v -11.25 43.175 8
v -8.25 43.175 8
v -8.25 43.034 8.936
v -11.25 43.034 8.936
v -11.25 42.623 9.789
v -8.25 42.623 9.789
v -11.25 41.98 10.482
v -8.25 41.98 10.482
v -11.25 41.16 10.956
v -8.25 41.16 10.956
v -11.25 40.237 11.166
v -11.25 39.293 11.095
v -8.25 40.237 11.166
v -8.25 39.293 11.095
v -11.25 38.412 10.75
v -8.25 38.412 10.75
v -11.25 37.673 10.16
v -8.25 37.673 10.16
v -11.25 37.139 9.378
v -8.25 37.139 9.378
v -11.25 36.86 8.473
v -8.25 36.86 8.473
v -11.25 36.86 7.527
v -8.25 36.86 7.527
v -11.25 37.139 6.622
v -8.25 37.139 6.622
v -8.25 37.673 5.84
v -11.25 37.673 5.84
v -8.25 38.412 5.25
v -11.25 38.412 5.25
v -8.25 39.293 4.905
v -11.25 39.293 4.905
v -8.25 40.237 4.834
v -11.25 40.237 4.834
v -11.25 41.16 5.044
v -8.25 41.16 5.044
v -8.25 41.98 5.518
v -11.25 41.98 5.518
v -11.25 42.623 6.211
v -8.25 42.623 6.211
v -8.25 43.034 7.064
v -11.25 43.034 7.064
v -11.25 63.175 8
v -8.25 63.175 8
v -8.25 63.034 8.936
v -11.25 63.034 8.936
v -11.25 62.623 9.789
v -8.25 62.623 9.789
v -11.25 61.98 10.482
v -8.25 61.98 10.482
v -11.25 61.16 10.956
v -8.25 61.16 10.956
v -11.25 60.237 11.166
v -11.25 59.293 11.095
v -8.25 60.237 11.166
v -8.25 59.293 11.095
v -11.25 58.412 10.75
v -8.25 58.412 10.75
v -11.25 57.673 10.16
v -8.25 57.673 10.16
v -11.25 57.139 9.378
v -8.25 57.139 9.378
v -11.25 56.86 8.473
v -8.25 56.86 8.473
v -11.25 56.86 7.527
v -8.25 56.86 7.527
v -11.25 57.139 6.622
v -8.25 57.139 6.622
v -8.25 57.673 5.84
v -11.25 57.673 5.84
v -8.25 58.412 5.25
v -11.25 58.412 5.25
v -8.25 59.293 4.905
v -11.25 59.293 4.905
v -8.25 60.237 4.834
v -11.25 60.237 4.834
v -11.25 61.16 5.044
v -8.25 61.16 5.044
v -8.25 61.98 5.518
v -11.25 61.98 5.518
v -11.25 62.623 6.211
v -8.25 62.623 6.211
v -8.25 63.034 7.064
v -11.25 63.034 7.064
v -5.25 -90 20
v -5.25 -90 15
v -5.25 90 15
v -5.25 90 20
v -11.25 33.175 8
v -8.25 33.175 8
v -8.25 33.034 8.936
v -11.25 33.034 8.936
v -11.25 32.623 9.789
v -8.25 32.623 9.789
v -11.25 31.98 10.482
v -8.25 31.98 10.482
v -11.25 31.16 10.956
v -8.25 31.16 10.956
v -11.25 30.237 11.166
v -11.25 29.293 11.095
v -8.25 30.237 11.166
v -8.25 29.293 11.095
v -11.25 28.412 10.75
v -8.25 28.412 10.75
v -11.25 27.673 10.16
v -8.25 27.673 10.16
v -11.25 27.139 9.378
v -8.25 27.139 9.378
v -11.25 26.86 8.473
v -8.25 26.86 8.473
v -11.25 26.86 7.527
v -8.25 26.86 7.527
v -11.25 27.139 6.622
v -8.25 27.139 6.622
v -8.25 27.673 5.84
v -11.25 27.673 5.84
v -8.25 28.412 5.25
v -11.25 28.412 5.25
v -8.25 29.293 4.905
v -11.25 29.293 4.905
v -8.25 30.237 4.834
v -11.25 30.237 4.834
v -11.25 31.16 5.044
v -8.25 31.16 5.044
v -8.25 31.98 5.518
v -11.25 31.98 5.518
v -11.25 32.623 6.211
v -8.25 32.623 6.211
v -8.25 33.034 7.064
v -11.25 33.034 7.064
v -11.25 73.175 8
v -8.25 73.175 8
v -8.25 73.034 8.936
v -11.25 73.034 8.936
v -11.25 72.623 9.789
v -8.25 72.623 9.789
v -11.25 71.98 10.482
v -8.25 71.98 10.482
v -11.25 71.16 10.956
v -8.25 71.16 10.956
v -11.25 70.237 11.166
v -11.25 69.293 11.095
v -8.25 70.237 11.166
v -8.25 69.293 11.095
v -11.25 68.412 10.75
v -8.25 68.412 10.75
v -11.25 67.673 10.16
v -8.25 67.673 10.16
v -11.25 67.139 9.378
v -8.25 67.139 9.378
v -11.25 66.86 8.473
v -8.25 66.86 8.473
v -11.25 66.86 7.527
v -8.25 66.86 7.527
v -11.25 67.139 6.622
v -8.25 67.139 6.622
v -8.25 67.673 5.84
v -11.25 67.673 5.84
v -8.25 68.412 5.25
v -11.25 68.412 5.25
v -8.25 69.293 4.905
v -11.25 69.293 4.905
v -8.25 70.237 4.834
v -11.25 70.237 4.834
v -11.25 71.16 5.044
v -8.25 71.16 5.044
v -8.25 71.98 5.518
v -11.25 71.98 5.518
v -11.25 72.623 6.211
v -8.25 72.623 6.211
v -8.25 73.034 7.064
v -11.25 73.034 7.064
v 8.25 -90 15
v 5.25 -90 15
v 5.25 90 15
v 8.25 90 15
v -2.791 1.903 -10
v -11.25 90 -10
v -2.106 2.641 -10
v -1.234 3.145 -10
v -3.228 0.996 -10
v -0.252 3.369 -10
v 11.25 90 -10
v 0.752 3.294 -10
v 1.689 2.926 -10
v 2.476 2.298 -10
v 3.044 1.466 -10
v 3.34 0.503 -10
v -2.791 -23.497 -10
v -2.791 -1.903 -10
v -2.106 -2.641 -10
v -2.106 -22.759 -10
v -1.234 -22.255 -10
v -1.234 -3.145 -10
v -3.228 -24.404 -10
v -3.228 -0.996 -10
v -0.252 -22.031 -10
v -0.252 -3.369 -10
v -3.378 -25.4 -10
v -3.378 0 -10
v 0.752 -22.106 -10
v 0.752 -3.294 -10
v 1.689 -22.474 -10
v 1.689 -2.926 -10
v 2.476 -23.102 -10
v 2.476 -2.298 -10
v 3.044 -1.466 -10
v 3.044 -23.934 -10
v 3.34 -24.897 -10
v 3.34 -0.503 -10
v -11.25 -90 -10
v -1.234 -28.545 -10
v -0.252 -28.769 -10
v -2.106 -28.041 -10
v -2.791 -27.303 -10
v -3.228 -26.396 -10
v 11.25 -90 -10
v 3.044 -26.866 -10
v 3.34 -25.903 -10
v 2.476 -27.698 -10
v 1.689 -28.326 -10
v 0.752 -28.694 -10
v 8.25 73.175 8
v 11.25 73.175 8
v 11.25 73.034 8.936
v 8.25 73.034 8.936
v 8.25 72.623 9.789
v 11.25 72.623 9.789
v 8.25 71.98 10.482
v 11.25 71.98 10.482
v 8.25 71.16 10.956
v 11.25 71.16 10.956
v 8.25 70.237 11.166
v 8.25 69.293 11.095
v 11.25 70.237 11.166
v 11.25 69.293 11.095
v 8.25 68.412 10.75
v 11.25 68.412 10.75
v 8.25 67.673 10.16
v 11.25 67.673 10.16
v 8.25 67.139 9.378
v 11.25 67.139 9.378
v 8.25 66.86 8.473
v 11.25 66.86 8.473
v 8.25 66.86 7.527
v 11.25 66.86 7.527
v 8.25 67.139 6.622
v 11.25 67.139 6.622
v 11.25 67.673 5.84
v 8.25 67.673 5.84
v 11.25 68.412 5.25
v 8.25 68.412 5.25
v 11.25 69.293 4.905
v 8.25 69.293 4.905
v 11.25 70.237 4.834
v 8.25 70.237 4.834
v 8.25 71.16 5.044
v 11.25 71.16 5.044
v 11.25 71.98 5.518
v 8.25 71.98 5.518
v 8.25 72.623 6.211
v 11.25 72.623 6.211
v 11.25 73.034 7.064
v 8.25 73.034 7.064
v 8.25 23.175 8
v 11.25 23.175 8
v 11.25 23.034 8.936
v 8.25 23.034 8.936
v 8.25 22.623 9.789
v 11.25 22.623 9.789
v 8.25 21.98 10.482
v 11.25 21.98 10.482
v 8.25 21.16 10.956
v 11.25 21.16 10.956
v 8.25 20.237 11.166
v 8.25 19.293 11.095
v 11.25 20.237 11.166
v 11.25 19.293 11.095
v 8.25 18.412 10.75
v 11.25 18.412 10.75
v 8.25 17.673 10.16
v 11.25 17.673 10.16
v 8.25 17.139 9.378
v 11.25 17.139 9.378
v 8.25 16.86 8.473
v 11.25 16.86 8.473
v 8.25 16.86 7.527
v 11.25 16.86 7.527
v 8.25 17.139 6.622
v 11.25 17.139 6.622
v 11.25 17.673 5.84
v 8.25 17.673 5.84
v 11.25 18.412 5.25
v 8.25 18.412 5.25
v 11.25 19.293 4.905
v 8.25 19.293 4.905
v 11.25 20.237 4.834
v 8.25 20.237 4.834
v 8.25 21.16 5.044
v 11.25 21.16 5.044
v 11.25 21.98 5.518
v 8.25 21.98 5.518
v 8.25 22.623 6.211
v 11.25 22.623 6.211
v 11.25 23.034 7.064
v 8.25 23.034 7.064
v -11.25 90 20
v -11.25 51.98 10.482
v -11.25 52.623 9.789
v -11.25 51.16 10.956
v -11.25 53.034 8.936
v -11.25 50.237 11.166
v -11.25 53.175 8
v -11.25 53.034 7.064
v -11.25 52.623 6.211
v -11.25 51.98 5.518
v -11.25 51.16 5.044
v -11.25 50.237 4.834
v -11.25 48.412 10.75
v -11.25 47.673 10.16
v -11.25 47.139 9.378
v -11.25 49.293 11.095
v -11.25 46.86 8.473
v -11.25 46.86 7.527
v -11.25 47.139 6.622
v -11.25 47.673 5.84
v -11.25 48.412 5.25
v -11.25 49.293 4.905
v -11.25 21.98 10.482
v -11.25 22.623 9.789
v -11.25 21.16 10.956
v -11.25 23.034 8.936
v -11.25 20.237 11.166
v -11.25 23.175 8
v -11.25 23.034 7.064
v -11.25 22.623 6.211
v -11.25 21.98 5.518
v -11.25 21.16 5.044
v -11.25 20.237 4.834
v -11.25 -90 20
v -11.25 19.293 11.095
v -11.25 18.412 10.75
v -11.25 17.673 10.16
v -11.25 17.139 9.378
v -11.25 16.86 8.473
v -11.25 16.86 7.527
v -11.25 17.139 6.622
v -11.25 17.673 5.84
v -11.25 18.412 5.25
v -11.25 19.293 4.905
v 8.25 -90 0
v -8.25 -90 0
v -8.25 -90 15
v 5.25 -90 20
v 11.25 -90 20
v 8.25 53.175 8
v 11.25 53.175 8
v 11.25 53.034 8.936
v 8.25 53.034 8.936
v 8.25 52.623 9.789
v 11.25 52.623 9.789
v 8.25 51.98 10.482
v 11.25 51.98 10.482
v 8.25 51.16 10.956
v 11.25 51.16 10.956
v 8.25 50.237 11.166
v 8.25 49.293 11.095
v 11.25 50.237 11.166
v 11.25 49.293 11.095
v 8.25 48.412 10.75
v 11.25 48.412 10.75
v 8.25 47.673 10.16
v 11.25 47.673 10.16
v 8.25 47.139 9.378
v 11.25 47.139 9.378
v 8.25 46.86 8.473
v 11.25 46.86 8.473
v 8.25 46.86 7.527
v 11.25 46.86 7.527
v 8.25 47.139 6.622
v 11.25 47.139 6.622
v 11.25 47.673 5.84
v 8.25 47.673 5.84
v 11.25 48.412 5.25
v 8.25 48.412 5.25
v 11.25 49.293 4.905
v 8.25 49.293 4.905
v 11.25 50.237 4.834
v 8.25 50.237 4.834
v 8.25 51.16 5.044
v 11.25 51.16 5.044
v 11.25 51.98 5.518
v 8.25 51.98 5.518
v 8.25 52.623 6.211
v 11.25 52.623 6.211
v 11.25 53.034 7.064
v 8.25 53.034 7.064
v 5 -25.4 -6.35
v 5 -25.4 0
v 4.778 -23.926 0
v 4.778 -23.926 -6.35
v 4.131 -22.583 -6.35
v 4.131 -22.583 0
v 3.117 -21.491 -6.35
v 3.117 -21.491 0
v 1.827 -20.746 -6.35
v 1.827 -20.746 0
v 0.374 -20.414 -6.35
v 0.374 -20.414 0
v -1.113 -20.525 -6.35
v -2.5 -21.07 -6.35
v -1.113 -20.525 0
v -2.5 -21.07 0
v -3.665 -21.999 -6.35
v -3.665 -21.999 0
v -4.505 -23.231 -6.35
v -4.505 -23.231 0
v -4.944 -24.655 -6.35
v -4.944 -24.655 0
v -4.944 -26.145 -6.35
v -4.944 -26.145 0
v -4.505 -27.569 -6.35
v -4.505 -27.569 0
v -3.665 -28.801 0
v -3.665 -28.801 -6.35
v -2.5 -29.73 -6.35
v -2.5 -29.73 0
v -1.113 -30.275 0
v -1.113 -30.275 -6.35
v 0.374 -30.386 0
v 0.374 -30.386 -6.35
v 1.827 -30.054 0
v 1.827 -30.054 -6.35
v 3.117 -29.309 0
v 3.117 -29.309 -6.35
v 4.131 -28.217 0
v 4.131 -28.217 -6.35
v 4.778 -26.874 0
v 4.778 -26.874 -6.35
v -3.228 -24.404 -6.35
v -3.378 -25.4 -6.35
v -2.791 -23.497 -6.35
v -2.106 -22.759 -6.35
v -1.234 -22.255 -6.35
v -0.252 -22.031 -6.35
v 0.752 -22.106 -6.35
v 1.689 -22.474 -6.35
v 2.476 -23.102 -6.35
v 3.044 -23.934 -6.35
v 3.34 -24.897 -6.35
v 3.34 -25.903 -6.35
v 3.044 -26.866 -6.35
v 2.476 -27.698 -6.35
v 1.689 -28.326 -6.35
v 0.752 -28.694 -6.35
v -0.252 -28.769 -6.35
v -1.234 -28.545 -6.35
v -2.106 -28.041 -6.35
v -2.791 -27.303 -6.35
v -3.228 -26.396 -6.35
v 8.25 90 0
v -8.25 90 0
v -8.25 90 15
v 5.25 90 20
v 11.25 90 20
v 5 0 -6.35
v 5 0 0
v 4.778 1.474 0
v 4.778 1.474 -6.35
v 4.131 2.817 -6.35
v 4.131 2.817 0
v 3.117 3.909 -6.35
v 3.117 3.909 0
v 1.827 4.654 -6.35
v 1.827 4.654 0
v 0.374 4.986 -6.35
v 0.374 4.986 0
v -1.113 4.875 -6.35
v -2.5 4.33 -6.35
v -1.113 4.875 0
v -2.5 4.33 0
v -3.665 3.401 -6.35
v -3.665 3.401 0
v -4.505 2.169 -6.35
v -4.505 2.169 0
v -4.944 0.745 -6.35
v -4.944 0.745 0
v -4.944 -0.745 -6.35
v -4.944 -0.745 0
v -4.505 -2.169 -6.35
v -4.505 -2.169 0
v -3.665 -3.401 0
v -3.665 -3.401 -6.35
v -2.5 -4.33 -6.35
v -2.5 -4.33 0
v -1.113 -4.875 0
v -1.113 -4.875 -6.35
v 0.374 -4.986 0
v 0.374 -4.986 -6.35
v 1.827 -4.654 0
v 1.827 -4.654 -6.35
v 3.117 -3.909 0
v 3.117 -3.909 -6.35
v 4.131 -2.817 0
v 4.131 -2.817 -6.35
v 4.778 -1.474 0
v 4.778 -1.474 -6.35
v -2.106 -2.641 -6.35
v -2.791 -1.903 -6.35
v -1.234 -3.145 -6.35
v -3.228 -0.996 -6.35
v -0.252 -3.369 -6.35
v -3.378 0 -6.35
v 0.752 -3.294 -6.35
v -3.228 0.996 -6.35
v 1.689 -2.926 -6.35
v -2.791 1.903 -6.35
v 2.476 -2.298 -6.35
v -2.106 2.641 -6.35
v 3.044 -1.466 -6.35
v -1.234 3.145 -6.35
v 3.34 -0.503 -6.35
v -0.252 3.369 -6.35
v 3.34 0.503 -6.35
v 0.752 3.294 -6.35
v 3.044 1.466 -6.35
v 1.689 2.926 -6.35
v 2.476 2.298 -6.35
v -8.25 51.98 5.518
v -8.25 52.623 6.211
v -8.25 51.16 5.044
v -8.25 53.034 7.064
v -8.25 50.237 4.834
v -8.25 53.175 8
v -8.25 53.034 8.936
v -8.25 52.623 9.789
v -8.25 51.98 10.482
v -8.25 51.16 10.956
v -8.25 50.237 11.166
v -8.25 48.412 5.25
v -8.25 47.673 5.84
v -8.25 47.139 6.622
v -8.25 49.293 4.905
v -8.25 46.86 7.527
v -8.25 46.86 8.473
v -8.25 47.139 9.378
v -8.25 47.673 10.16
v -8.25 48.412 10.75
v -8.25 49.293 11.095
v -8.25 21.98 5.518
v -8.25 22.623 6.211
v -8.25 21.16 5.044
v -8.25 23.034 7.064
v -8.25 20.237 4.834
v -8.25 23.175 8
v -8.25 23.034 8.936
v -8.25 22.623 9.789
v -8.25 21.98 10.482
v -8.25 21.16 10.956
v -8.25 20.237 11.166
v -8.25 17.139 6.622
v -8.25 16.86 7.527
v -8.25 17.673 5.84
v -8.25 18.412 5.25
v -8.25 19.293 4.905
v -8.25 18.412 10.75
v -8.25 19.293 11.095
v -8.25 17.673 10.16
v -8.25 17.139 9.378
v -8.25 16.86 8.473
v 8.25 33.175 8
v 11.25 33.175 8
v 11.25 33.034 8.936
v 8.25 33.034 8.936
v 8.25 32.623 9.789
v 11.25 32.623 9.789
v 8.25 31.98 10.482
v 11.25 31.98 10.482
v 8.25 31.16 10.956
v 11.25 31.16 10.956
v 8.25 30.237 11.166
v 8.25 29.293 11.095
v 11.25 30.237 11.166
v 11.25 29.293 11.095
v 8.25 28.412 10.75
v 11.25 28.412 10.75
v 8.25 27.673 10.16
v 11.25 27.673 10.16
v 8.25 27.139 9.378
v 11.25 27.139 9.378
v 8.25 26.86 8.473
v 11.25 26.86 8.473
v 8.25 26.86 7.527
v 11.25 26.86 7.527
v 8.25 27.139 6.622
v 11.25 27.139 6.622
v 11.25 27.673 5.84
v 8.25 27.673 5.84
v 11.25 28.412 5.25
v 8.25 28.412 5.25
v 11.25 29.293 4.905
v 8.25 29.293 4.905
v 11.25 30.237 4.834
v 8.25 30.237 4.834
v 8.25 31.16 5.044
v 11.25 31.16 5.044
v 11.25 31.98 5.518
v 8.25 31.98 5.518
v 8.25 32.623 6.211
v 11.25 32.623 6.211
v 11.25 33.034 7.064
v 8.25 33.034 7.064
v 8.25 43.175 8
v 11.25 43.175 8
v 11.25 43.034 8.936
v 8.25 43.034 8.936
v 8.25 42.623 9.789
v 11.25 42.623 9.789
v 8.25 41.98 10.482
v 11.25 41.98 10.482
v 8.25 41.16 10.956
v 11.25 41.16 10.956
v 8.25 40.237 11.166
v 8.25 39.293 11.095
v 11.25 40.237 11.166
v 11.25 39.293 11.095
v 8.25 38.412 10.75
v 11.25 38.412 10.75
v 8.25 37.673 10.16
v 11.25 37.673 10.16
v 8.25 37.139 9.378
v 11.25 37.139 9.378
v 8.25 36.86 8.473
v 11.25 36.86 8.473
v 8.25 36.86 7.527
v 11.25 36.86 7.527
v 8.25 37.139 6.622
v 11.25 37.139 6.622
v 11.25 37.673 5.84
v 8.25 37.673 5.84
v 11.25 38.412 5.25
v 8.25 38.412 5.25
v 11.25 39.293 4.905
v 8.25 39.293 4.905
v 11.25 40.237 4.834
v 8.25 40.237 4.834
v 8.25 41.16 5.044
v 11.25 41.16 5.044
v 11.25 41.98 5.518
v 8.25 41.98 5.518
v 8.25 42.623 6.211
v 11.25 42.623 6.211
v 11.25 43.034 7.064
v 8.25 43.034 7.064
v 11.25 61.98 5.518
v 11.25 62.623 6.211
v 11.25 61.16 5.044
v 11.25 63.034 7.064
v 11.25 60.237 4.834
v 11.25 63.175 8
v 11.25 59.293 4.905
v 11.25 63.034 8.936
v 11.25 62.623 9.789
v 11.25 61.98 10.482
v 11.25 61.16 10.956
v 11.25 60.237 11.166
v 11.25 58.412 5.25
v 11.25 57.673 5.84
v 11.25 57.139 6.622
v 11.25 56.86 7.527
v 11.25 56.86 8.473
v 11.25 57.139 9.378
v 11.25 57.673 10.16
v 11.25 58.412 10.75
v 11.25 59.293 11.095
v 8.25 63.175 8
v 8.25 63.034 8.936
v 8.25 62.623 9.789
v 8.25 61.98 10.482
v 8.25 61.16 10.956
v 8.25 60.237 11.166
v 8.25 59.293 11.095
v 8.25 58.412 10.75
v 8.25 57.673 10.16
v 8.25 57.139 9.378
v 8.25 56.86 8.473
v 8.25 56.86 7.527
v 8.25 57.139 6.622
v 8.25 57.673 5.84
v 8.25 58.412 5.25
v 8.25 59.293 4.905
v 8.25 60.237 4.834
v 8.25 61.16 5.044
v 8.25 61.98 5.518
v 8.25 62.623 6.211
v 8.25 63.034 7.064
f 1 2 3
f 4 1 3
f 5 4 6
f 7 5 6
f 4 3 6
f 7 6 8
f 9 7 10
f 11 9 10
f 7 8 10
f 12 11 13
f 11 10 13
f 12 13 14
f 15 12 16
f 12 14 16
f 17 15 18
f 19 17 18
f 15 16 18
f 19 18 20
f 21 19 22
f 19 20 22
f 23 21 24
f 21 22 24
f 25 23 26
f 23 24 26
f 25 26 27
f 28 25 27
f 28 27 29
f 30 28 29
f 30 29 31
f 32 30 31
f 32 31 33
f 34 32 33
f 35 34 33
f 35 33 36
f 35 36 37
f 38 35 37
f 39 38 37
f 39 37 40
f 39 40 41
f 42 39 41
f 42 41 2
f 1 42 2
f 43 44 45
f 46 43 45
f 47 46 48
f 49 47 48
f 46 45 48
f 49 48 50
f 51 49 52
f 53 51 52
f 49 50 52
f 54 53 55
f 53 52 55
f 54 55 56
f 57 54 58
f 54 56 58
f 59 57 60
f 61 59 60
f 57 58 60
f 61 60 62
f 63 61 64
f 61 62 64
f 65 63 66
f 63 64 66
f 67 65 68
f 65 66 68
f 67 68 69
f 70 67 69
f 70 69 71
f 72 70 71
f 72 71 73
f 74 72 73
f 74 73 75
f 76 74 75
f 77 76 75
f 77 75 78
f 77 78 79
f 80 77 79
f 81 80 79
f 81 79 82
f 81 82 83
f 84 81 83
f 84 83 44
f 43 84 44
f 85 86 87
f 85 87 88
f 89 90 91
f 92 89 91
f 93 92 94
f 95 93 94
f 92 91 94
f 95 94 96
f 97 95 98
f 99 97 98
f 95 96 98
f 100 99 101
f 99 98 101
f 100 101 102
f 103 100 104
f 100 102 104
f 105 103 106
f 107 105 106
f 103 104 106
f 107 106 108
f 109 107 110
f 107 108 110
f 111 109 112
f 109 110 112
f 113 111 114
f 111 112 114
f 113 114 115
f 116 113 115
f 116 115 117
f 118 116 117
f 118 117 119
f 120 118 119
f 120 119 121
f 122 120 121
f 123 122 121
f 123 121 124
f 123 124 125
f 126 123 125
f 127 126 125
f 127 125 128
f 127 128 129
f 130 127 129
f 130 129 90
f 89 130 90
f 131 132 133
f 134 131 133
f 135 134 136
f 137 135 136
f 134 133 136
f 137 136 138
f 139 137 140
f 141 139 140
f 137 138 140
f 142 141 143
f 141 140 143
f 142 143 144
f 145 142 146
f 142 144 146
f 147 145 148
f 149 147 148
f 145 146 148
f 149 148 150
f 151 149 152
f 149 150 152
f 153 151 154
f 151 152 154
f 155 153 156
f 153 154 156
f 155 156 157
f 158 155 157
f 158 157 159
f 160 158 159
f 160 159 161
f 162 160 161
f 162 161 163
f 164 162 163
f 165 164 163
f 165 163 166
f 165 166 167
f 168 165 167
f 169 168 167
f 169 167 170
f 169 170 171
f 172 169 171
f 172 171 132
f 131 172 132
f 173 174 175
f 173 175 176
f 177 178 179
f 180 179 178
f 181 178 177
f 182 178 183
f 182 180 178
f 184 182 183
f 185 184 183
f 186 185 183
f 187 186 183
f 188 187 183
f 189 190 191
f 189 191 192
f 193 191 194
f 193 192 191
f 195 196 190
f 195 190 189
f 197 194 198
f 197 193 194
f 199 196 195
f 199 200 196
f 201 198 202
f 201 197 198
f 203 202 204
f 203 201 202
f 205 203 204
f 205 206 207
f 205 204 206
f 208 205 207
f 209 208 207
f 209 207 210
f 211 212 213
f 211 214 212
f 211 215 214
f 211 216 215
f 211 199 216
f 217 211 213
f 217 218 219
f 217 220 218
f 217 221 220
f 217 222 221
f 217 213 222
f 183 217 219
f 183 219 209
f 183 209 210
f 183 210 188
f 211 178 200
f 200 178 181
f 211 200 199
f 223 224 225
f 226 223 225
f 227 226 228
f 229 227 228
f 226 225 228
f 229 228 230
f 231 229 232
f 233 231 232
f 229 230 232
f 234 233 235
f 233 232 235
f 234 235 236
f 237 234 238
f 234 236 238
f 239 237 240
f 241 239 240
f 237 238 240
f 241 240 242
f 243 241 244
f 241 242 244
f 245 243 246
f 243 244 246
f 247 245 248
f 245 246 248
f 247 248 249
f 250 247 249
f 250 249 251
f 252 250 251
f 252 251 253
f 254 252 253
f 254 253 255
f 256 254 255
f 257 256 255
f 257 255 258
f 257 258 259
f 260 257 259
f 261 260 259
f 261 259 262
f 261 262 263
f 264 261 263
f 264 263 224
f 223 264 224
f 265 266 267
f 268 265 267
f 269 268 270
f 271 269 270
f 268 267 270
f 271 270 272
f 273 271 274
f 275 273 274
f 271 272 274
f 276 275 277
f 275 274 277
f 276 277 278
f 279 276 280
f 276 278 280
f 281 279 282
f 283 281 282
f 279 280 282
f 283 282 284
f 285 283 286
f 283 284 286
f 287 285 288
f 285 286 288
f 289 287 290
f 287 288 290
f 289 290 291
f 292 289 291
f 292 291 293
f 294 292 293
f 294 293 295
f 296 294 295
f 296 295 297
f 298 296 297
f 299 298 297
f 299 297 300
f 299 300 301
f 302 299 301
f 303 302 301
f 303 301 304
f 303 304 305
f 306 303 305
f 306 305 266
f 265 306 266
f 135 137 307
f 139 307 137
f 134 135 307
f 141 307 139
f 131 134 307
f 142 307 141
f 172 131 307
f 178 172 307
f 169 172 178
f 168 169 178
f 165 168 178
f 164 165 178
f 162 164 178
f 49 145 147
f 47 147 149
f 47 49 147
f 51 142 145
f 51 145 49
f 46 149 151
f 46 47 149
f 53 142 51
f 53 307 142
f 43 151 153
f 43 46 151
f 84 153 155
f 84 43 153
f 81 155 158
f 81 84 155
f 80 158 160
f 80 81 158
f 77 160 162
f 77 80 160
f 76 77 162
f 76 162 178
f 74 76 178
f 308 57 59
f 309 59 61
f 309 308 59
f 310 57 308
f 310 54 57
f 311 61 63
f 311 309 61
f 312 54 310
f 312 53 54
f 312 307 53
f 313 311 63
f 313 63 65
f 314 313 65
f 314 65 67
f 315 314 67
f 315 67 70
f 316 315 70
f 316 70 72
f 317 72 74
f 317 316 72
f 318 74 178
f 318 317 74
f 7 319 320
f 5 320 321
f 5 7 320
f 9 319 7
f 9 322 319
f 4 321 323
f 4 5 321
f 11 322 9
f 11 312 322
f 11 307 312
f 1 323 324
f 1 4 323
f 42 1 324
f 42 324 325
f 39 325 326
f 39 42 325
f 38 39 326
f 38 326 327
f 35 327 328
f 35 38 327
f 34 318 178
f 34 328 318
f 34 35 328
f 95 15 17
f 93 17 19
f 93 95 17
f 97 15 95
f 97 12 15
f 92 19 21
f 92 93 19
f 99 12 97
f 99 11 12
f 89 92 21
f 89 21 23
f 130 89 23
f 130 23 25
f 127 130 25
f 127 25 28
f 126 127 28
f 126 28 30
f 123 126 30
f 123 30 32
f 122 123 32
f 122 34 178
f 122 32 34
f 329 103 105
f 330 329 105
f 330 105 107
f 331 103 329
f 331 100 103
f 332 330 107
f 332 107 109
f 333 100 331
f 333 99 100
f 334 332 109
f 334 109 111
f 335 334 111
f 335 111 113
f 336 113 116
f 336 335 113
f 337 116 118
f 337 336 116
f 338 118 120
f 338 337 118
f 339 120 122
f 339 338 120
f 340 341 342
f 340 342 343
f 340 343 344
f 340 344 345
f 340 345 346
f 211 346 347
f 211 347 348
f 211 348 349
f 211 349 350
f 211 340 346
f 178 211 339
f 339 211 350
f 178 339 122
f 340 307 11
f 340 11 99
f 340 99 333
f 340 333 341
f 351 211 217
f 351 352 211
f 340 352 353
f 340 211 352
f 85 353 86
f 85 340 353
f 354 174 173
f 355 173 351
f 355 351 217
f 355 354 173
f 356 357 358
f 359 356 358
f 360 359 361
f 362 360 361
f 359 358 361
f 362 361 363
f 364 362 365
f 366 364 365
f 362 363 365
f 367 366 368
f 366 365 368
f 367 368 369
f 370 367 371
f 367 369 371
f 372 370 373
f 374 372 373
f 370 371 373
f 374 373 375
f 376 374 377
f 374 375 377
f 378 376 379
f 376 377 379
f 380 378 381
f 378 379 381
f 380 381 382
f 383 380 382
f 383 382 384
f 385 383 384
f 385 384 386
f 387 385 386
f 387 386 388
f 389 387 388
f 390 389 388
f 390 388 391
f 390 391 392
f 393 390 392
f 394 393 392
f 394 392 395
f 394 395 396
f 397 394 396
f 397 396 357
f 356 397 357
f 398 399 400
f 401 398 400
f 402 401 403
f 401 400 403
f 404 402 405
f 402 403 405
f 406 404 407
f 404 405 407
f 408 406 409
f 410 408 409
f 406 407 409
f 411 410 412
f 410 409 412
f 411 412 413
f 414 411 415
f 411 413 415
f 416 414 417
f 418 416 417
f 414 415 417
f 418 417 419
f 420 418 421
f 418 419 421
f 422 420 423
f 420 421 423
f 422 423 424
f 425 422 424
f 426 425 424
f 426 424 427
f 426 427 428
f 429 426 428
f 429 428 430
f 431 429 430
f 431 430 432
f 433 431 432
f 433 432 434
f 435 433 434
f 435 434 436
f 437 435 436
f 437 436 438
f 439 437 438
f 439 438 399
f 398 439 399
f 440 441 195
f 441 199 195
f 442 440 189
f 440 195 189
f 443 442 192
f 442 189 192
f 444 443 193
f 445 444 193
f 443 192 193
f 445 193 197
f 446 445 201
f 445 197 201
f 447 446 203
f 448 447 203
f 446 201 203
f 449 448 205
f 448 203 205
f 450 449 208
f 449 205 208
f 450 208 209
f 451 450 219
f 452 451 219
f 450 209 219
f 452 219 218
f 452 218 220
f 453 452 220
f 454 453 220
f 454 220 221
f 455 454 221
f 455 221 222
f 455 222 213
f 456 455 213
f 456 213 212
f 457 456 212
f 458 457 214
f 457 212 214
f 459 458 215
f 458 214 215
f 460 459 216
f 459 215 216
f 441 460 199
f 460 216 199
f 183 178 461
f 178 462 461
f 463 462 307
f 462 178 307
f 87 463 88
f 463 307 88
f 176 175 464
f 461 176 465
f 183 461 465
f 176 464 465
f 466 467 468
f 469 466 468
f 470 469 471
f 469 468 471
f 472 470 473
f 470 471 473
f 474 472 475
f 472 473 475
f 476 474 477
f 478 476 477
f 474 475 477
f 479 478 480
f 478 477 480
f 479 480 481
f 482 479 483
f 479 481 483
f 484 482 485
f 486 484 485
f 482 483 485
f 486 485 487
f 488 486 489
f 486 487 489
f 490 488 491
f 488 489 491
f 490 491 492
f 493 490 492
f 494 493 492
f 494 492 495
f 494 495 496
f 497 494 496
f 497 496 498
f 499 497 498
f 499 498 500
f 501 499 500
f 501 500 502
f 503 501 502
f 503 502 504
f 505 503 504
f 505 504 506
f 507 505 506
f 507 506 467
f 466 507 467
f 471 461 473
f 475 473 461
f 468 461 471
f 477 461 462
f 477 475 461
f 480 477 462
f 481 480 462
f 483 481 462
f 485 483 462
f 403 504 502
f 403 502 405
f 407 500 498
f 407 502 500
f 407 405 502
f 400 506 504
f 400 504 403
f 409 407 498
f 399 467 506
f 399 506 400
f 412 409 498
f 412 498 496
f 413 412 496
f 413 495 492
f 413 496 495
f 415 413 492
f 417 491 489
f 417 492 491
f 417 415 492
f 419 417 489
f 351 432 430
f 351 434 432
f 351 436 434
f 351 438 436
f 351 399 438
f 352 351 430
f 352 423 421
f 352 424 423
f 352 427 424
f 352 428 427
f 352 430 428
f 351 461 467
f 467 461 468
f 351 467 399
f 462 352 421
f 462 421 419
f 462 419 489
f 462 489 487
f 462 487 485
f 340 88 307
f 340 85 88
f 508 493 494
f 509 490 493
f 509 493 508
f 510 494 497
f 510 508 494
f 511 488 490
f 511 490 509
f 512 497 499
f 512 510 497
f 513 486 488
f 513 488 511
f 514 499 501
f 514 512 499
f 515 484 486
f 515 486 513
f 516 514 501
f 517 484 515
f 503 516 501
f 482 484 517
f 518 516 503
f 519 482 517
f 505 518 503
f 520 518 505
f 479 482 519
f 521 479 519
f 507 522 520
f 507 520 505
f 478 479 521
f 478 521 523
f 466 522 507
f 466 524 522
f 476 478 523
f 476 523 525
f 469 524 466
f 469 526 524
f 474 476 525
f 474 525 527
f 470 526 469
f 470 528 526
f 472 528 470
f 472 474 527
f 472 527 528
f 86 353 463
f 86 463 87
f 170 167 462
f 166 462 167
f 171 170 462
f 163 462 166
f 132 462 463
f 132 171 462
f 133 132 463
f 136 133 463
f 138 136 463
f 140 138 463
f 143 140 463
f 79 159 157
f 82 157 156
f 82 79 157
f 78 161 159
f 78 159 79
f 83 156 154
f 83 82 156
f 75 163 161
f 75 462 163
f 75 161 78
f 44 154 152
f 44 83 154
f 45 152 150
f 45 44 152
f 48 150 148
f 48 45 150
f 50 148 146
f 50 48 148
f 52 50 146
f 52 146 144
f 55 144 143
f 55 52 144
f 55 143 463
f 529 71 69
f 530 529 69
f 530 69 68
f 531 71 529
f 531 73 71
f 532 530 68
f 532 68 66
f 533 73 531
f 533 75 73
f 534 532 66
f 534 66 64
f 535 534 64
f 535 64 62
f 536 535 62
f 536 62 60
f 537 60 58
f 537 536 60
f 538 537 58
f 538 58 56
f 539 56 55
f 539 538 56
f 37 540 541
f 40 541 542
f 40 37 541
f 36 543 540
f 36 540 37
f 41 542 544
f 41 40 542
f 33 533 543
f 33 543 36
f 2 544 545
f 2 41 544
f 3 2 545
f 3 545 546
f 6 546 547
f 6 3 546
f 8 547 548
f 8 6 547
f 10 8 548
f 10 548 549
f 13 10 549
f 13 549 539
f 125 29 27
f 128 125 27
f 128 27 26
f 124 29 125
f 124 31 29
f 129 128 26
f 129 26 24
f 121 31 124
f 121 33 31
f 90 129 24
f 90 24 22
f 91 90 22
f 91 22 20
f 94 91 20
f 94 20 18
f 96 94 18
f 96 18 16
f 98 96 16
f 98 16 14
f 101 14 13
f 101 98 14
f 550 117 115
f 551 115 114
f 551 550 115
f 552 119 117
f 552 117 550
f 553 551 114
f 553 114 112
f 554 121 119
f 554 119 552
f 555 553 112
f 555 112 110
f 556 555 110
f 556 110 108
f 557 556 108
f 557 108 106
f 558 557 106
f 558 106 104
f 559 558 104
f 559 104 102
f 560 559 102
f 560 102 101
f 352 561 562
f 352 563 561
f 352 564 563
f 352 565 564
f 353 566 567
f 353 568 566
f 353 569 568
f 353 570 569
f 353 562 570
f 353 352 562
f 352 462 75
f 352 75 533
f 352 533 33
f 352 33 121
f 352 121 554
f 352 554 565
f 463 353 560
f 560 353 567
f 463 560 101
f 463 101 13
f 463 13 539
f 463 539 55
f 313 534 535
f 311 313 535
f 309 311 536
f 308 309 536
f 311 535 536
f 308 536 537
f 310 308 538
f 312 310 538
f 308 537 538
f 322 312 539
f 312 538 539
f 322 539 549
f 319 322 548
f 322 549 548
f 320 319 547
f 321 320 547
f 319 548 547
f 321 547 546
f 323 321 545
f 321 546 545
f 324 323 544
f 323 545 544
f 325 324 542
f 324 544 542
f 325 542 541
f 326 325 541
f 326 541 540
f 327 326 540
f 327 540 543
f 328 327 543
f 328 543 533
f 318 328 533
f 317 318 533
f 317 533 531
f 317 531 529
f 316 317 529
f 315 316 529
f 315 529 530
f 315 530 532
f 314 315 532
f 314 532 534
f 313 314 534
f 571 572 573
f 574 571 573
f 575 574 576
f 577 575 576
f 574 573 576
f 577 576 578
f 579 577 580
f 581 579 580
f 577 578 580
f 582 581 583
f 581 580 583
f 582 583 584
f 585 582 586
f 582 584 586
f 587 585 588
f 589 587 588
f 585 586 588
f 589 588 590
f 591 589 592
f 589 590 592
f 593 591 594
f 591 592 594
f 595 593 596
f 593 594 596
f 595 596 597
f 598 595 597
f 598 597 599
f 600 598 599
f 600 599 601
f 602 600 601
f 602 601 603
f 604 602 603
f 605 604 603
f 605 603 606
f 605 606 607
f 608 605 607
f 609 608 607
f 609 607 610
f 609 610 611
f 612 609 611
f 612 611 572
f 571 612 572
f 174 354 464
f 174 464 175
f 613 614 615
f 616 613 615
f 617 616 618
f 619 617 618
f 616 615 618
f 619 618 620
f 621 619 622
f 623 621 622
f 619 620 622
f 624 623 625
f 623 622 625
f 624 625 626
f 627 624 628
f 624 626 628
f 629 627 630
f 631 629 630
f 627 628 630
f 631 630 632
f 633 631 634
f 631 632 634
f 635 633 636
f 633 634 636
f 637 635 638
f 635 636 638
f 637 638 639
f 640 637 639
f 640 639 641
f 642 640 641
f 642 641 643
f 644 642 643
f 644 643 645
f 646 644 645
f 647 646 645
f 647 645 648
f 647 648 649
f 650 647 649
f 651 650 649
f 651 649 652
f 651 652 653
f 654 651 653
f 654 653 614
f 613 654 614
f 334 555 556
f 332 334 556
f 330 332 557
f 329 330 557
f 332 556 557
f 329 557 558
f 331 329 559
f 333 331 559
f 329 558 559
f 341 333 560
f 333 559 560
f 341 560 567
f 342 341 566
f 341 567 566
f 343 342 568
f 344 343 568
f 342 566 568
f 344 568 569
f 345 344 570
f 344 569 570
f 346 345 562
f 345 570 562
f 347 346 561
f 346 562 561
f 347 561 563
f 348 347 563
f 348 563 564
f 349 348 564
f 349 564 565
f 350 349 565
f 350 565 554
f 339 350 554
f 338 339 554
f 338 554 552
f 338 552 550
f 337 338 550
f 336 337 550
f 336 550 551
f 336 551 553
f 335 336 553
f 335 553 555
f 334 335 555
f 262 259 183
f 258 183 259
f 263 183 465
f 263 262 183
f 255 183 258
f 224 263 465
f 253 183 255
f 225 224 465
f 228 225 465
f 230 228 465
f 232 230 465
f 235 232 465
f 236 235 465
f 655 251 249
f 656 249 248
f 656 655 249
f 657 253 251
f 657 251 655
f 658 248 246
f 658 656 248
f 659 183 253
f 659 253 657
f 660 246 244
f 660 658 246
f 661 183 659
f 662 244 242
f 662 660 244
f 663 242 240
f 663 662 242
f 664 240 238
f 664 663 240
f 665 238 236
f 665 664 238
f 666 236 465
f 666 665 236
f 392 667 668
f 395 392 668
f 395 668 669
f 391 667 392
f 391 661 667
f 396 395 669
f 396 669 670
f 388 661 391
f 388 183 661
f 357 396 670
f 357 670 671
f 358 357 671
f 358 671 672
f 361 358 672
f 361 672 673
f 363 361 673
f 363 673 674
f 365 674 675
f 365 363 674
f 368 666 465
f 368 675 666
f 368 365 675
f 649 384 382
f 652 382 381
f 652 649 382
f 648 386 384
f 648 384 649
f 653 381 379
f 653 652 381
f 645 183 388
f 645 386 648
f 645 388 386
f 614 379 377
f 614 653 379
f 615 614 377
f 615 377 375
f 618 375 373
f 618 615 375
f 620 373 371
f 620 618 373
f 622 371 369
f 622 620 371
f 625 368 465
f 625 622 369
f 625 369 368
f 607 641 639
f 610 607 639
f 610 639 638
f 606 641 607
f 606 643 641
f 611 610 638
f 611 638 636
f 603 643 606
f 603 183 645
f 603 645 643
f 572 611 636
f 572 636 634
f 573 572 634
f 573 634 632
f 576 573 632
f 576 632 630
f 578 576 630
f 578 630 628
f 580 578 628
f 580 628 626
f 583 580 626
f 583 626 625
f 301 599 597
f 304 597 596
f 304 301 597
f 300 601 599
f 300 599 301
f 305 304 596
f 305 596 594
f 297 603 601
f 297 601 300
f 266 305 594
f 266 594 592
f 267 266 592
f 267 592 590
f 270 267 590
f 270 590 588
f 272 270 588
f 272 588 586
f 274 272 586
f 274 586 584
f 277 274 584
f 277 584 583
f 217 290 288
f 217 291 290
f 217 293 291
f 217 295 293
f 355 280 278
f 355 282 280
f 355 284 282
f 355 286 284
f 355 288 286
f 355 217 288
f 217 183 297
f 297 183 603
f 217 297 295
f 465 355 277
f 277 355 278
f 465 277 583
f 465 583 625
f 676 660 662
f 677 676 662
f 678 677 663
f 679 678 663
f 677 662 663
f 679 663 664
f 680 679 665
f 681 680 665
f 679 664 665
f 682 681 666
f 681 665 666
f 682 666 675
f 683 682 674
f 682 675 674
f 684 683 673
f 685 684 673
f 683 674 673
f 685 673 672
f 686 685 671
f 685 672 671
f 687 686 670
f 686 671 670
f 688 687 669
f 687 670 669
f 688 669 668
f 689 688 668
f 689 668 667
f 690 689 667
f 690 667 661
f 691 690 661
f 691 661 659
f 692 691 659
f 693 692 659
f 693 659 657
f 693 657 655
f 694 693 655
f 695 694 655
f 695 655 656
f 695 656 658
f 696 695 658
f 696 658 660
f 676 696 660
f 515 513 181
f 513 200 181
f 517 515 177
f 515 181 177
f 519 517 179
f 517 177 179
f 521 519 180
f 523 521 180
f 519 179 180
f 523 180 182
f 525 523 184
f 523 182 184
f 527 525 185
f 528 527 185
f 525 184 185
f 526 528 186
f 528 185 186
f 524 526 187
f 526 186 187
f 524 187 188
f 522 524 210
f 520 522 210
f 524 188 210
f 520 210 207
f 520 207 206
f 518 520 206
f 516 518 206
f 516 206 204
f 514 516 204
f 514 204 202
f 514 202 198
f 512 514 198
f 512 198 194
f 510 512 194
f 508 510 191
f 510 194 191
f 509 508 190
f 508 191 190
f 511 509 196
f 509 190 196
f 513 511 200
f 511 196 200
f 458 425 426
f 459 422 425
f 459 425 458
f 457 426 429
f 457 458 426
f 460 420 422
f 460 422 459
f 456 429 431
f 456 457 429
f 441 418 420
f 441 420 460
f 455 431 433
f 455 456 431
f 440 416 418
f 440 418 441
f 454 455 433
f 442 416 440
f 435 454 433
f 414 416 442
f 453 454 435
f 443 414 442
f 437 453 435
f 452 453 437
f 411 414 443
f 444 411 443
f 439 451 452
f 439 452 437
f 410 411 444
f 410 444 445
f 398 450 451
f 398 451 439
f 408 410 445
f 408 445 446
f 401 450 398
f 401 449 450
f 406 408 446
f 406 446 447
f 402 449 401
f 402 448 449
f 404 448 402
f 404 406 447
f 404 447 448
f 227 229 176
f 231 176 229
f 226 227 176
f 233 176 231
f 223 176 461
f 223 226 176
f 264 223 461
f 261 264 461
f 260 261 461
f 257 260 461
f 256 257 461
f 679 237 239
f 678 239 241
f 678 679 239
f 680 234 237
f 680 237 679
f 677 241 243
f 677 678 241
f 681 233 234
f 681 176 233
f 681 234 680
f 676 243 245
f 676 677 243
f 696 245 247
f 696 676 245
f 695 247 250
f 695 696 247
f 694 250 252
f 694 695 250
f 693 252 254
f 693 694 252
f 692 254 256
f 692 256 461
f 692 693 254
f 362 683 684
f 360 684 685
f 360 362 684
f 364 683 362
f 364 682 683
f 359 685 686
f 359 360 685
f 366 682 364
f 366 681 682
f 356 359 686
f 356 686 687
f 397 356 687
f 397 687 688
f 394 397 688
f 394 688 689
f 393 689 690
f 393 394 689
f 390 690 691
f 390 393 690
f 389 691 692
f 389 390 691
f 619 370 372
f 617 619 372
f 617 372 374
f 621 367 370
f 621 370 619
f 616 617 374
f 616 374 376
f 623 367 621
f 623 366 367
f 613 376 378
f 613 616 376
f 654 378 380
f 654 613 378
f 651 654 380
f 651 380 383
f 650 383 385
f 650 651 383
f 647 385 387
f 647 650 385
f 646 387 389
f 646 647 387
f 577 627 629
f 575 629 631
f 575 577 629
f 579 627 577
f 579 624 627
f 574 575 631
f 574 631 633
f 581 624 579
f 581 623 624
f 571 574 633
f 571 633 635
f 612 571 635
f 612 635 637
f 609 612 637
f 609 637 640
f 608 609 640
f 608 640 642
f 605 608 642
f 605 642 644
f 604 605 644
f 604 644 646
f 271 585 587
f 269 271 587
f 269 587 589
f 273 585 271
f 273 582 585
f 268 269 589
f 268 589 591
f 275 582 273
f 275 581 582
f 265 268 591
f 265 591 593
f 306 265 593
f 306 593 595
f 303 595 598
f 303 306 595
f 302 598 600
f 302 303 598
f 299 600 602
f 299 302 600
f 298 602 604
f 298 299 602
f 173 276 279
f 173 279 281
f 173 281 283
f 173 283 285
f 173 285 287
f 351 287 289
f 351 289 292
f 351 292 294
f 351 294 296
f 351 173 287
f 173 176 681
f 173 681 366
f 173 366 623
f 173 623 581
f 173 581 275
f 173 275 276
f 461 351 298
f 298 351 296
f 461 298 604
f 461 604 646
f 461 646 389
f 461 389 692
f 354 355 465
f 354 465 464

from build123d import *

# Parameters (mm, degrees)
F1_DEPTH       = 90
F3_D           = 6.7564
F3_CBORE_D     = 10
F3_CBORE_DEPTH = 6.35
F4_R           = 3.175
F5_DEPTH       = 25
F7_D           = 6.7564
F7_CBORE_D     = 10
F7_CBORE_DEPTH = 6.35


with BuildPart() as f1:
    # F0 (on Front) → F1 (new body, symmetric)
    with BuildSketch(Plane.XZ):
        Polygon((-11.25, -10), (0, -10), (11.25, -10), (11.25, 20), (5.25, 20), (5.25, 15), (8.25, 15), (8.25, 0), (5.25, 0), (0, 0), (-5.25, 0), (-8.25, 0), (-8.25, 15), (-5.25, 15), (-5.25, 20), (-11.25, 20), align=None)
    extrude(amount=F1_DEPTH, both=True)

    # F3 (through all)
    with Locations(Plane.XY):
        with Locations((0, 0)):
            CounterBoreHole(F3_D / 2, F3_CBORE_D / 2, F3_CBORE_DEPTH)

    # F4 (on face) → F5 (cut)
    with BuildSketch(Plane.YZ.offset(11.25)):
        with Locations((40, 8)):
            Circle(F4_R)
        with Locations((50, 8)):
            Circle(F4_R)
        with Locations((60, 8)):
            Circle(F4_R)
        with Locations((30, 8)):
            Circle(F4_R)
        with Locations((20, 8)):
            Circle(F4_R)
        with Locations((70, 8)):
            Circle(F4_R)
    extrude(amount=-F5_DEPTH, mode=Mode.SUBTRACT)

    # F7 (through all)
    with Locations(Plane.XY):
        with Locations((0, -25.4)):
            CounterBoreHole(F7_D / 2, F7_CBORE_D / 2, F7_CBORE_DEPTH)


solid = f1.part
